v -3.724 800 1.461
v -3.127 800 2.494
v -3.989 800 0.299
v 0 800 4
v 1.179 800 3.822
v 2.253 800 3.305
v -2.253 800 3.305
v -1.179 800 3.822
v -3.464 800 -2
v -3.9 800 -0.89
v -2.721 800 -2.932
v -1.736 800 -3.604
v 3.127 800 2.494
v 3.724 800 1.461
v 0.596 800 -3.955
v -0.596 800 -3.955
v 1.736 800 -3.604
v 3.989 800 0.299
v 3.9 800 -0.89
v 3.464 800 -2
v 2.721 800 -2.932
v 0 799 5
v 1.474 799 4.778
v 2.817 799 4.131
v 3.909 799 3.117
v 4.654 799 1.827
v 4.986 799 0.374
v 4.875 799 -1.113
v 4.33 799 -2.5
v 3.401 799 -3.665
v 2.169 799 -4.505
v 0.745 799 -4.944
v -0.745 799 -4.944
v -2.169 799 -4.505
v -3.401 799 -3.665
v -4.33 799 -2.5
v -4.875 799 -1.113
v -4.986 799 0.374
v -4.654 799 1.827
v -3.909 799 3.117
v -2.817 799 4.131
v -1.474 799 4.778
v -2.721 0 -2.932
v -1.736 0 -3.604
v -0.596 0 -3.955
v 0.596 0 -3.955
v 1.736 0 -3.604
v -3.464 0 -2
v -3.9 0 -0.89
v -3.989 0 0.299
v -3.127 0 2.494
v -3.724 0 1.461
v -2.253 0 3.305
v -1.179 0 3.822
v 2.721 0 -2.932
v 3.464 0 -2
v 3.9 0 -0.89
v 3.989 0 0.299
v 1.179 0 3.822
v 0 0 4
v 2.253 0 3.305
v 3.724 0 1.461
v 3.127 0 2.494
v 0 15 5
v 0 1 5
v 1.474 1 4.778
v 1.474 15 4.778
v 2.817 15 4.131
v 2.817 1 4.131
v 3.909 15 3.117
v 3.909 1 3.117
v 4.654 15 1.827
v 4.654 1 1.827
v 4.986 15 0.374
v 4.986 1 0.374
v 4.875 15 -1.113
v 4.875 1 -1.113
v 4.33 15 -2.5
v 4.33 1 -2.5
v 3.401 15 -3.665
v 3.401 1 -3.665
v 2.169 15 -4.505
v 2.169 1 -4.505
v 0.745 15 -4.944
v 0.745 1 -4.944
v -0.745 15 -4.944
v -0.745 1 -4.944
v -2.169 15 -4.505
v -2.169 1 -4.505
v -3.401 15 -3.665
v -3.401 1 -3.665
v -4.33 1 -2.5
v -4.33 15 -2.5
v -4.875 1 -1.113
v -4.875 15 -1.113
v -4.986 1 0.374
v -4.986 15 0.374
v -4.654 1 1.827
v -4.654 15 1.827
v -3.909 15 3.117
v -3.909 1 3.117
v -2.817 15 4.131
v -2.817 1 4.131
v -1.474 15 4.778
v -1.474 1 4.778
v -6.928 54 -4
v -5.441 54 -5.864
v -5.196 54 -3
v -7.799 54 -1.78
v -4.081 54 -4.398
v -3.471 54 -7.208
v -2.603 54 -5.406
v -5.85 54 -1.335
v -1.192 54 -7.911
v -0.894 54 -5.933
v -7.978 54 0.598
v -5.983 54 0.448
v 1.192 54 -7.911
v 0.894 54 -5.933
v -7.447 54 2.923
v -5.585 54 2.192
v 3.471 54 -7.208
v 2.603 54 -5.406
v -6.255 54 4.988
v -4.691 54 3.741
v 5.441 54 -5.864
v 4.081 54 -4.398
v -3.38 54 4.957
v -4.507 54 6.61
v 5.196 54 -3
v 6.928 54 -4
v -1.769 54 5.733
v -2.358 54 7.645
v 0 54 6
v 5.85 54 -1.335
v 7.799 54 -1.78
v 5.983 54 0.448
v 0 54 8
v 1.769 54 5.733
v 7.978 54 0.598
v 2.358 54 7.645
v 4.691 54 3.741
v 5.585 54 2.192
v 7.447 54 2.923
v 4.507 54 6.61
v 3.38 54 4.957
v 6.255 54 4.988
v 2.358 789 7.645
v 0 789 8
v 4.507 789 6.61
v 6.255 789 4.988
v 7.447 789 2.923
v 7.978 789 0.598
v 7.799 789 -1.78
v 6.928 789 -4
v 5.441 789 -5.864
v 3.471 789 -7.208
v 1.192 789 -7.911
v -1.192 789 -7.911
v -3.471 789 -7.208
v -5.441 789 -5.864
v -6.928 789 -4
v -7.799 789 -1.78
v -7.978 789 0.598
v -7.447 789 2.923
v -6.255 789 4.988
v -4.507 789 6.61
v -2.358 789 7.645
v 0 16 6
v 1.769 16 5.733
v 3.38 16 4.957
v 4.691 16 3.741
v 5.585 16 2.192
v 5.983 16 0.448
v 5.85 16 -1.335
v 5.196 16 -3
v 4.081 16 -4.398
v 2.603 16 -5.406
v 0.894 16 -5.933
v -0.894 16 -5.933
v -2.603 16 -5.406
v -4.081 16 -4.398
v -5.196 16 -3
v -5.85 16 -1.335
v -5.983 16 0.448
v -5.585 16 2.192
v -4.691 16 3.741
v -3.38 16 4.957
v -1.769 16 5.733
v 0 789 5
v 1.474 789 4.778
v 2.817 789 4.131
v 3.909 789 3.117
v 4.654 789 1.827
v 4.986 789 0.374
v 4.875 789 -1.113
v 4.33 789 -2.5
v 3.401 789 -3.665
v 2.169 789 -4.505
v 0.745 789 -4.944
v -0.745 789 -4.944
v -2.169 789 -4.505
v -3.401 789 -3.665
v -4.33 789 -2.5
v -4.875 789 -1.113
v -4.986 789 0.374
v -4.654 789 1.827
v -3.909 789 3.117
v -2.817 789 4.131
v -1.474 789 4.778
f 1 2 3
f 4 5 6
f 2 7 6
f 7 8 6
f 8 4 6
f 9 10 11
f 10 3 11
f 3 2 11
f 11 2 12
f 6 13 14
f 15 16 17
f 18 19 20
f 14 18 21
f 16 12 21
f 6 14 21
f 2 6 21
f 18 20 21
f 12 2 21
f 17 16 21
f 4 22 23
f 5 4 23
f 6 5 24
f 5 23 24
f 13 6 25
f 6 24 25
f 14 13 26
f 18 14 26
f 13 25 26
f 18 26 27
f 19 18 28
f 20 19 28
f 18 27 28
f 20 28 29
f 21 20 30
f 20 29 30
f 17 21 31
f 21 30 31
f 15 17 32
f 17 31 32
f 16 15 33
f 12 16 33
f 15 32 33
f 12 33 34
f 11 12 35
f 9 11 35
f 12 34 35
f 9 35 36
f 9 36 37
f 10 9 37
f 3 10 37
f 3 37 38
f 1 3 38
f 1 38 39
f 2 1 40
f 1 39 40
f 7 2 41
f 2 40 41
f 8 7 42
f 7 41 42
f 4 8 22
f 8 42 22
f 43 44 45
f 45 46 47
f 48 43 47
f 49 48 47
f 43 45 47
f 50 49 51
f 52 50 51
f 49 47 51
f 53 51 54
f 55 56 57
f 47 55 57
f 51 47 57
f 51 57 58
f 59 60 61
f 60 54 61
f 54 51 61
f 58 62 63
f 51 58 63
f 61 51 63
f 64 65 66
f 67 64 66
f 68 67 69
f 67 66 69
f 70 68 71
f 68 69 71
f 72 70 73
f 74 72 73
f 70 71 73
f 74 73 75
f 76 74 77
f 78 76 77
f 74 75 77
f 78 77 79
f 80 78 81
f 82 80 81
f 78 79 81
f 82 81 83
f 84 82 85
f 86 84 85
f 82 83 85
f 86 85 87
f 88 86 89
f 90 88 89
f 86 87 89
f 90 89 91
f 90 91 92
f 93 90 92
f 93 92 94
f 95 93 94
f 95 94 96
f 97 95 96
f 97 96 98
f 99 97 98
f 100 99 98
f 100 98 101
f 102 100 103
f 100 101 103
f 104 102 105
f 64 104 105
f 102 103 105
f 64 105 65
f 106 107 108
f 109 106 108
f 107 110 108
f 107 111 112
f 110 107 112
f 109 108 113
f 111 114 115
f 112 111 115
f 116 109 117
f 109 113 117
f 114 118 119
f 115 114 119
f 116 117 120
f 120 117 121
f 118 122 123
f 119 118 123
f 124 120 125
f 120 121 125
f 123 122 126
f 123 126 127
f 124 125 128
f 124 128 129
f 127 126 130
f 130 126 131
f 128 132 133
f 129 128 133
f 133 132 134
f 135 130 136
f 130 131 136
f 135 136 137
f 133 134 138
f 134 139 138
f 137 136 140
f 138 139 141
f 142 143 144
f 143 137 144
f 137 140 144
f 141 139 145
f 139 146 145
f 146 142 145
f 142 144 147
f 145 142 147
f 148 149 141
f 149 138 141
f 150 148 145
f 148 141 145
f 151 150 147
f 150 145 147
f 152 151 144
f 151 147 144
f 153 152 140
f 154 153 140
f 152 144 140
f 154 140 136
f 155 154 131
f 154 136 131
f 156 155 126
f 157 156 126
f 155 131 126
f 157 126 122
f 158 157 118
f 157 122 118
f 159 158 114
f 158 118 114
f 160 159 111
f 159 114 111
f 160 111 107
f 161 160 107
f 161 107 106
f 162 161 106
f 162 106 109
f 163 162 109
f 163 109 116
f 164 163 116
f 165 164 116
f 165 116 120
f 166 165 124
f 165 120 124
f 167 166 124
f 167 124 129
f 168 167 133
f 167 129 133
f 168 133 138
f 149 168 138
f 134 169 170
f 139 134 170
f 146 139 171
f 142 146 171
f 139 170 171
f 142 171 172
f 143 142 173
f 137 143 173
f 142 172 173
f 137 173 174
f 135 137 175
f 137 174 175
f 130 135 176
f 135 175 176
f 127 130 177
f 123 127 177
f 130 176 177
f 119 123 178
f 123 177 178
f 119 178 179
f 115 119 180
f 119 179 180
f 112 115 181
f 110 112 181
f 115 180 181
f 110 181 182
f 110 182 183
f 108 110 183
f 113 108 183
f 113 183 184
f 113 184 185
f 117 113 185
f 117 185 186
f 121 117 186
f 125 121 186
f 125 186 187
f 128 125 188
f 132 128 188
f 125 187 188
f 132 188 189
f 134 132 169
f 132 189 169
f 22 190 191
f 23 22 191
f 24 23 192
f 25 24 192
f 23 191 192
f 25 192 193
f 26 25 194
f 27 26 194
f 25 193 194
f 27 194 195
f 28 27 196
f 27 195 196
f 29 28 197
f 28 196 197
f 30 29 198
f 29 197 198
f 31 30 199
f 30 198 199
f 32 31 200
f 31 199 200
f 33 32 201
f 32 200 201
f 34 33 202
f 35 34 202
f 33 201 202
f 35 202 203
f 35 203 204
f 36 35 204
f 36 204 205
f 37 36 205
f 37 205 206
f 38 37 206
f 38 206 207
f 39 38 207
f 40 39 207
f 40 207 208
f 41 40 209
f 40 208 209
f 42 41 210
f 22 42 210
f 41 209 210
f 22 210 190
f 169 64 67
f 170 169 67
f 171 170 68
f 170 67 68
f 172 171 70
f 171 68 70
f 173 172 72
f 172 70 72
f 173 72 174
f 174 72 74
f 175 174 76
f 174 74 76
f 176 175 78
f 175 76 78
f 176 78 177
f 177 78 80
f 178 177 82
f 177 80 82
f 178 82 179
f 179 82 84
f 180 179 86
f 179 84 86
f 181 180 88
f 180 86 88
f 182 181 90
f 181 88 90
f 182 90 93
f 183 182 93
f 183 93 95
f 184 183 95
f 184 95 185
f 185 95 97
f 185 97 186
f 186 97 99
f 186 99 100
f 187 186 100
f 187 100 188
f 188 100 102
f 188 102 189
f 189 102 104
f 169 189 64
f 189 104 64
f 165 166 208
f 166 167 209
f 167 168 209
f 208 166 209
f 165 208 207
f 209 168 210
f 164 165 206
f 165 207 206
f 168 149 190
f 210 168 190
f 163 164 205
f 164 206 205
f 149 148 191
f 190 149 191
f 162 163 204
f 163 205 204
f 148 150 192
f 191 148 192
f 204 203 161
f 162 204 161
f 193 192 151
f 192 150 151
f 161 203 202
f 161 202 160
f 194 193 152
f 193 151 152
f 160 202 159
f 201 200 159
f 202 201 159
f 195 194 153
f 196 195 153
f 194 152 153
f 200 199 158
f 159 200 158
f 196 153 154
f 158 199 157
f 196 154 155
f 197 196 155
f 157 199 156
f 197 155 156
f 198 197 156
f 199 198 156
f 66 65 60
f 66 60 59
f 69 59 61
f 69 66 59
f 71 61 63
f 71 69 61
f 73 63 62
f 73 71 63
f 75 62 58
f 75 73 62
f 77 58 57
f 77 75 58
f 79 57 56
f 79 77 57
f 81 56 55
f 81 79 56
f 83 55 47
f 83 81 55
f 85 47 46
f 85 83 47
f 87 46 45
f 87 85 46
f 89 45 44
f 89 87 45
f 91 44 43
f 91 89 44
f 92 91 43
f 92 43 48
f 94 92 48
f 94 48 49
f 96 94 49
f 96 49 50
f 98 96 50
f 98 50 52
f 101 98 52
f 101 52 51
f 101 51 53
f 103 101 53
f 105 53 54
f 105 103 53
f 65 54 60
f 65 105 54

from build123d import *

# Parameters (mm, degrees)
F2_SIZE = 0.99999


# Not quite as in the source:
# - a fillet or chamfer is up to 0.001 mm smaller than in the source, because OpenCascade refuses the exact size


with BuildPart() as f1:
    # F0 (on Right) → F1 (revolve)
    with BuildSketch(Plane.YZ):
        Polygon((0, 5), (0, 0), (800, 0), (800, 5), (789, 5), (789, 8), (54, 8), (54, 6), (15, 6), (15, 5), align=None)
    revolve(axis=Axis((0, 344.1624132916, 0), (0, 1, 0)))

    # F2 (size 1 in the source; OpenCascade refuses exactly that, so slightly less here)
    f2_edges = [f1.edges().sort_by_distance(p)[0] for p in [
        (0, 0, -5),
        (0, 15, -6),
        (0, 800, -5),
    ]]
    chamfer(f2_edges, length=F2_SIZE)


solid = f1.part
